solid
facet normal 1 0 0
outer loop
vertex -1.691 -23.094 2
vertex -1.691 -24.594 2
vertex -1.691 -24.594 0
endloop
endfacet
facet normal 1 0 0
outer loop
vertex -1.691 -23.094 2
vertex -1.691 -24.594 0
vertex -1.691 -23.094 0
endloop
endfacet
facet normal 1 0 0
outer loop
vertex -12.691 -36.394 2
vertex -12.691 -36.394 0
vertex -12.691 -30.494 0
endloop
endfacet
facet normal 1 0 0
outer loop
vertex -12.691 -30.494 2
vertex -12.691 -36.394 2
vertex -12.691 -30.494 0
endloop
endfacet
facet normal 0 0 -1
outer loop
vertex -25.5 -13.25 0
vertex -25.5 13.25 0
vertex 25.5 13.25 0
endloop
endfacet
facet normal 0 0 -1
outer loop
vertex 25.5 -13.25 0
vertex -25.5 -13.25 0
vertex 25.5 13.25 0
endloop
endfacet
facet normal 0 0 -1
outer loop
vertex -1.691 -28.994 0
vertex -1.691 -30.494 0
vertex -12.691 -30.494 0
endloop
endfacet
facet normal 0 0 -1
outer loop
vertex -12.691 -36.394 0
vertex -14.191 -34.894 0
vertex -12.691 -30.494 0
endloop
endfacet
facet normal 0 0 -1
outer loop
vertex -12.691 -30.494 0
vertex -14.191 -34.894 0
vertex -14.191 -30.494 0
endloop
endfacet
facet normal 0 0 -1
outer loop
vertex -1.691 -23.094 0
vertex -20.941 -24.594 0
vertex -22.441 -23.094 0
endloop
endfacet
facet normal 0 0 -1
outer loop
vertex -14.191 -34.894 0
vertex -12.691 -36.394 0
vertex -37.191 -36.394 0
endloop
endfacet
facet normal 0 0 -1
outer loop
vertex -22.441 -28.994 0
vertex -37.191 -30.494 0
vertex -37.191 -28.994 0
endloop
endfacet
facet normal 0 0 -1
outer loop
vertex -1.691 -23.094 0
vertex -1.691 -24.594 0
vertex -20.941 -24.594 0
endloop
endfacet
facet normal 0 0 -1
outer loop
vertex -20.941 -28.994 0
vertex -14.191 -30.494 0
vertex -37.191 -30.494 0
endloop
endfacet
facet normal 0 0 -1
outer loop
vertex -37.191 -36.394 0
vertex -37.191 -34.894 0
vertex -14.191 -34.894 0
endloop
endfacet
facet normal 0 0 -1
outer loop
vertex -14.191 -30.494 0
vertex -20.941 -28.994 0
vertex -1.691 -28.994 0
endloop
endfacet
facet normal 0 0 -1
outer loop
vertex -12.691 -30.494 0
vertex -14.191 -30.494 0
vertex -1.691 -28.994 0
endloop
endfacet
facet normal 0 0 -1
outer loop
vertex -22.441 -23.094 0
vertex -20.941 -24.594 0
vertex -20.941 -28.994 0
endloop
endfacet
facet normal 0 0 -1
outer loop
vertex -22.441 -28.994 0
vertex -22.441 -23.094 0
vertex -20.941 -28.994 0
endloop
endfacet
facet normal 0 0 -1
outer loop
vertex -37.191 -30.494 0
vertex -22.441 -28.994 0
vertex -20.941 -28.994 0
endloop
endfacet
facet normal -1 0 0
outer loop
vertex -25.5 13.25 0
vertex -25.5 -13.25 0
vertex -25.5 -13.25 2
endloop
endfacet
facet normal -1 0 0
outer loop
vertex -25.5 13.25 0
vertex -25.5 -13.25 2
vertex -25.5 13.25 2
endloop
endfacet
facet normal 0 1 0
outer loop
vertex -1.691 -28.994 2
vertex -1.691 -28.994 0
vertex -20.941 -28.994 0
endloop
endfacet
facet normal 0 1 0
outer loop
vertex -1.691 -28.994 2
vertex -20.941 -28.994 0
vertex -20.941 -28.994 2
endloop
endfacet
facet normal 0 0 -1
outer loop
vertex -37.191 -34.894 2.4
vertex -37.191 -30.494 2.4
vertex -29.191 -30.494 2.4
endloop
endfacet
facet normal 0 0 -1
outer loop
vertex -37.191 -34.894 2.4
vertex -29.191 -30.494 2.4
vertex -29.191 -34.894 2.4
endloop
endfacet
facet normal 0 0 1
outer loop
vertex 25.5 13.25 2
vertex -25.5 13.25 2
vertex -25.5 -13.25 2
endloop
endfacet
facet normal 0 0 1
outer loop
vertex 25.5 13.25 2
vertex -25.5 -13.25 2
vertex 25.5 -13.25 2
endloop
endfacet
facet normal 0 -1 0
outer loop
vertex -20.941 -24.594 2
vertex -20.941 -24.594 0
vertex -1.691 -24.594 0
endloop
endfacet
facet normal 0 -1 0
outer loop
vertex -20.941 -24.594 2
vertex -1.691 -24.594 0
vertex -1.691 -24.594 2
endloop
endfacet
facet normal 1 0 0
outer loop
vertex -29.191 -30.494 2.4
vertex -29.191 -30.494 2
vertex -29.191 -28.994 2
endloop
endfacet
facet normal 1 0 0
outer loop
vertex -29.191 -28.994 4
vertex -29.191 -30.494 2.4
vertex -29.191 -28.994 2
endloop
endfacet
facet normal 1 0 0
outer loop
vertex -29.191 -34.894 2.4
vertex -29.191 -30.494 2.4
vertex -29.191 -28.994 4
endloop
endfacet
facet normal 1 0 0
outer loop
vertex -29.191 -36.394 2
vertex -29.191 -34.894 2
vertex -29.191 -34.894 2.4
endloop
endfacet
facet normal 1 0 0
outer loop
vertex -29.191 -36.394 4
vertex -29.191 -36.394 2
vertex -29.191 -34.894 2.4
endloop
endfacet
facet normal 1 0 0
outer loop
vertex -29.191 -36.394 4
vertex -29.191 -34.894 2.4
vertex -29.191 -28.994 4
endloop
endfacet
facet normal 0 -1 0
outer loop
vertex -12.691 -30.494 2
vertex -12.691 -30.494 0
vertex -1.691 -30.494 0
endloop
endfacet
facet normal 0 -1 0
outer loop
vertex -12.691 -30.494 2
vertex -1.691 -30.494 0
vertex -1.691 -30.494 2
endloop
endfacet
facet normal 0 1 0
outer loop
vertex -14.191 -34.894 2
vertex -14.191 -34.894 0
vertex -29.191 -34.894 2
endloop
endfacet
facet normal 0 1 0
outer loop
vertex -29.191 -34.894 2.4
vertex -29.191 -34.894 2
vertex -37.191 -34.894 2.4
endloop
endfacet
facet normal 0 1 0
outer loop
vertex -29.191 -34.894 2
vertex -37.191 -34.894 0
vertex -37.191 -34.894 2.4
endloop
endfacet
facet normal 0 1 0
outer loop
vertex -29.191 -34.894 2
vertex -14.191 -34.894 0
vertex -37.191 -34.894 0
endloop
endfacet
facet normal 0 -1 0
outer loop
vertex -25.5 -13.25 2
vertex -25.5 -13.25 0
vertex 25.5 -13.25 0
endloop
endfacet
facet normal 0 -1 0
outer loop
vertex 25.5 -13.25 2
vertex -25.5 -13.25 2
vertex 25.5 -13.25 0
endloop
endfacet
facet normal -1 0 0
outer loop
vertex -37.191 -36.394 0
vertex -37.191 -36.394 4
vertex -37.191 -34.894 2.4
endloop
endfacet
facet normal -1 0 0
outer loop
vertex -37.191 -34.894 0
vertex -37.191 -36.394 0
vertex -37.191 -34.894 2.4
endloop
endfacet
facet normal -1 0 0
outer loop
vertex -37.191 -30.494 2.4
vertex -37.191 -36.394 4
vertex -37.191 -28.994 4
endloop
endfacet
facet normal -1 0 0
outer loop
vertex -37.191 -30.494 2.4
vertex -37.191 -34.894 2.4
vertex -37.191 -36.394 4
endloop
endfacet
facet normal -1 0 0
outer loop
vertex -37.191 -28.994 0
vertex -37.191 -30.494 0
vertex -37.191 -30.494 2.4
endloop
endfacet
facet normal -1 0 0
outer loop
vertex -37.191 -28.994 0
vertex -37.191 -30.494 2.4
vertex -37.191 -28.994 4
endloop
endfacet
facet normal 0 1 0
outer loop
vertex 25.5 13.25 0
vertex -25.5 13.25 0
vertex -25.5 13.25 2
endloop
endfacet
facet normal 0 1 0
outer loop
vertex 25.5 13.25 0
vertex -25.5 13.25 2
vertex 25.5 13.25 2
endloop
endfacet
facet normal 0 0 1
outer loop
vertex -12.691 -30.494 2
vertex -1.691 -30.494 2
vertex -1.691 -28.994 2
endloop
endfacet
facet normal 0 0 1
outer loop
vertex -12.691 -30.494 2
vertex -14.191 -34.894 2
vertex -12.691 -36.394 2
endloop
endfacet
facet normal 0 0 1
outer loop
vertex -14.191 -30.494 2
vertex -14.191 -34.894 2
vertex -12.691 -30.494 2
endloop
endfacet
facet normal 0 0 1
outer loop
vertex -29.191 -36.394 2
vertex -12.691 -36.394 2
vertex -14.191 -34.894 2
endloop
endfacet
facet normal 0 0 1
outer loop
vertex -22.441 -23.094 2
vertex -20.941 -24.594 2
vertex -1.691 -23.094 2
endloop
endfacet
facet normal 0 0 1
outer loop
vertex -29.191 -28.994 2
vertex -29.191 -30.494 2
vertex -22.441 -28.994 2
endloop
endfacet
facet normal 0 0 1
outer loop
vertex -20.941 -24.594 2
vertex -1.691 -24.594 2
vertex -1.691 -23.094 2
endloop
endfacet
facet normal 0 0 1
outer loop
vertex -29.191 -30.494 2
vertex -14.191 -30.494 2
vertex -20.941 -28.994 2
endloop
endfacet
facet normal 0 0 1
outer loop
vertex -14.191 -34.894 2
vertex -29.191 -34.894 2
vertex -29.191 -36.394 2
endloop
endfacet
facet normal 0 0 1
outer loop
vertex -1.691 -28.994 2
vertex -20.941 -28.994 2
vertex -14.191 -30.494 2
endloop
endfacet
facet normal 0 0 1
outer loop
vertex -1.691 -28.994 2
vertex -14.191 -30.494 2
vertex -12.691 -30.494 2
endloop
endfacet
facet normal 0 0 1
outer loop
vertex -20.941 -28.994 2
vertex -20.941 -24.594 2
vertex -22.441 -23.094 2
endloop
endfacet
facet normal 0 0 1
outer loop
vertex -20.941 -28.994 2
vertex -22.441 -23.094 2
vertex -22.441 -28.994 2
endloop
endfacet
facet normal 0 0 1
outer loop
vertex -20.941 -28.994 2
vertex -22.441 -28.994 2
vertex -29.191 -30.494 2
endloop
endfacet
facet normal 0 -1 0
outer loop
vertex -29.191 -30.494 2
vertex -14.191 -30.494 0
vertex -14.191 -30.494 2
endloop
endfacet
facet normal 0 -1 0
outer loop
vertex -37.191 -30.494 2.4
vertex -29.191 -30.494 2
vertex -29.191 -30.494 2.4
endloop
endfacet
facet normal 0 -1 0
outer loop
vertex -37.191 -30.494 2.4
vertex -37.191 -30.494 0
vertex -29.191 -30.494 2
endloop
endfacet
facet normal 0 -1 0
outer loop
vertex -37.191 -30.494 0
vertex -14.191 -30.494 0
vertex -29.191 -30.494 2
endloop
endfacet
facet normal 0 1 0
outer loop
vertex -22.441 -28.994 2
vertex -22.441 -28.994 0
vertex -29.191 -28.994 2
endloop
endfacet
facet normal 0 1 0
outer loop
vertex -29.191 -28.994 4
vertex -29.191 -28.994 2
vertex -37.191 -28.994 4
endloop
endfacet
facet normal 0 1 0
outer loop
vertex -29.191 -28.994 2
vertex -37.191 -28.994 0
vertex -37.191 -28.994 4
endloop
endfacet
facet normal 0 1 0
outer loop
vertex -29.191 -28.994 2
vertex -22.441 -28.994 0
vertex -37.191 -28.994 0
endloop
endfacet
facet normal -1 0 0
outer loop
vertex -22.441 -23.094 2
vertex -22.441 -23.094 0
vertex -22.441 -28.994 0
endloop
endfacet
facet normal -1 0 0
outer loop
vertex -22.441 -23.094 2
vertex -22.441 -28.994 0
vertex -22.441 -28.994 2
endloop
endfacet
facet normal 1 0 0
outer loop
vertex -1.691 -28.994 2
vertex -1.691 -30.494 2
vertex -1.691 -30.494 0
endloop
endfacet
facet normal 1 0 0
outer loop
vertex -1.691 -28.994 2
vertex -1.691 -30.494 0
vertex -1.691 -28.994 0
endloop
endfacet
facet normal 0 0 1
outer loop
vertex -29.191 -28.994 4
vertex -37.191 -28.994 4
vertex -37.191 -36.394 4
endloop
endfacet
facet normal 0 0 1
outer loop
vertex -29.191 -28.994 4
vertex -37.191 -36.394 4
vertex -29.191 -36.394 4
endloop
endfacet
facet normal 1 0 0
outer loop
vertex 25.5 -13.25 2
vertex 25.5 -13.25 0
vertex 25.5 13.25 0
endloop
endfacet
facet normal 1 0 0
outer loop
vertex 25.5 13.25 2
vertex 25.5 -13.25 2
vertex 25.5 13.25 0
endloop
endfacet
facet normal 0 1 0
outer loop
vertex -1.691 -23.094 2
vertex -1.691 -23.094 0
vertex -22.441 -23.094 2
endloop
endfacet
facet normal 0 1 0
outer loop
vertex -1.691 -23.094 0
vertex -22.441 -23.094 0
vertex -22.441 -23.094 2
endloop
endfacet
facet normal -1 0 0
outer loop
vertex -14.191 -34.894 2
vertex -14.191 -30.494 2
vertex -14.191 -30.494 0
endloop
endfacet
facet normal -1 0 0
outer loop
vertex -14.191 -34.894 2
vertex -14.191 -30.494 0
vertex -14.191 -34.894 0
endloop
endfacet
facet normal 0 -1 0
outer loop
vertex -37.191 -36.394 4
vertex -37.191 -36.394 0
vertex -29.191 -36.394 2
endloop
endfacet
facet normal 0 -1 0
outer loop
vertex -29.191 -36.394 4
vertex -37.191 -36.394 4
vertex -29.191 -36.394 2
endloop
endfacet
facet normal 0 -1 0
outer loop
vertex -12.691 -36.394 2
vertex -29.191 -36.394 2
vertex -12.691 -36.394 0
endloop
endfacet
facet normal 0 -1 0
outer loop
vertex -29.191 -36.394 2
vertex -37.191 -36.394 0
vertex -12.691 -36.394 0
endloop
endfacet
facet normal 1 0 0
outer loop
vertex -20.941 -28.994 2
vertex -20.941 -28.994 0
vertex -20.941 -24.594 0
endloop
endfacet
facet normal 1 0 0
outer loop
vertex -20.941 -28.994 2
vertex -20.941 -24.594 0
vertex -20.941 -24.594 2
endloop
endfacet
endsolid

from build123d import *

# Parameters (mm, degrees)
F0_W      = 51
F0_H      = 26.5
F1_DEPTH  = 2
F2_W      = 24.5
F2_H      = 7.4
F3_DEPTH  = 4
F4_W      = 4.4
F4_H      = 2.4
F5_DEPTH  = 23
F6_W      = 16.5
F6_H      = 2
F7_DEPTH  = 49.6448081987
F10_R     = 1.5
F11_R     = 1.5
F14_W     = 1.5
F14_H     = 2
F15_DEPTH = 11
F16_W     = 1.5
F16_H     = 2
F17_DEPTH = 5.9
F18_W     = 1.5
F18_H     = 2
F19_DEPTH = 19.25


with BuildPart() as f1:
    # F0 (on Top) → F1 (new body)
    with BuildSketch(Plane.XY):
        Rectangle(F0_W, F0_H)
    extrude(amount=F1_DEPTH)


with BuildPart() as f3:
    # F2 (on Top) → F3 (new body)
    with BuildSketch(Plane.XY):
        with Locations((-24.9405779243, -32.6938081987)):
            Rectangle(F2_W, F2_H)
    extrude(amount=F3_DEPTH)

    # F4 (on face) → F5 (cut)
    with BuildSketch(Plane(origin=(-37.1905779243, 0, 0), x_dir=(0, -1, 0), z_dir=(-1, 0, 0))):
        with Locations((32.6938081987, 1.2)):
            Rectangle(F4_W, F4_H)
    extrude(amount=-F5_DEPTH, mode=Mode.SUBTRACT)

    # F6 (on face) → F7 (cut, through all)
    with BuildSketch(Plane.XZ.offset(36.3938081987)):
        with Locations((-20.9405779243, 3)):
            Rectangle(F6_W, F6_H)
    extrude(amount=-F7_DEPTH, mode=Mode.SUBTRACT)


with BuildPart() as f8_1:
    # F8: instance of F3
    add(f3.part.mirror(Plane.XZ))


with BuildPart() as f9_1:
    # F9: instance of F3
    add(f3.part.mirror(Plane.YZ))

    # F10
    f10_edges = [f9_1.edges().sort_by_distance(p)[0] for p in [
        (33.190578, -36.393808, 4),
    ]]
    fillet(f10_edges, radius=F10_R)

    # F11
    f11_edges = [f9_1.edges().sort_by_distance(p)[0] for p in [
        (33.190578, -28.993808, 4),
    ]]
    fillet(f11_edges, radius=F11_R)


with BuildPart() as f3_1:
    add(f3.part)

    # F14 (on face) → F15 (join)
    with BuildSketch(Plane.YZ.offset(-12.6905779243)):
        with Locations((-29.7438081987, 1)):
            Rectangle(F14_W, F14_H)
    extrude(amount=F15_DEPTH)

    # F16 (on face) → F17 (join)
    with BuildSketch(Plane(origin=(0, -28.9938081987, 0), x_dir=(-1, 0, 0), z_dir=(0, 1, 0))):
        with Locations((21.6905779243, 1)):
            Rectangle(F16_W, F16_H)
    extrude(amount=F17_DEPTH)

    # F18 (on face) → F19 (join)
    with BuildSketch(Plane.YZ.offset(-20.9405779243)):
        with Locations((-23.8438081987, 1)):
            Rectangle(F18_W, F18_H)
    extrude(amount=F19_DEPTH)


solid = Compound([f1.part, f3_1.part])
